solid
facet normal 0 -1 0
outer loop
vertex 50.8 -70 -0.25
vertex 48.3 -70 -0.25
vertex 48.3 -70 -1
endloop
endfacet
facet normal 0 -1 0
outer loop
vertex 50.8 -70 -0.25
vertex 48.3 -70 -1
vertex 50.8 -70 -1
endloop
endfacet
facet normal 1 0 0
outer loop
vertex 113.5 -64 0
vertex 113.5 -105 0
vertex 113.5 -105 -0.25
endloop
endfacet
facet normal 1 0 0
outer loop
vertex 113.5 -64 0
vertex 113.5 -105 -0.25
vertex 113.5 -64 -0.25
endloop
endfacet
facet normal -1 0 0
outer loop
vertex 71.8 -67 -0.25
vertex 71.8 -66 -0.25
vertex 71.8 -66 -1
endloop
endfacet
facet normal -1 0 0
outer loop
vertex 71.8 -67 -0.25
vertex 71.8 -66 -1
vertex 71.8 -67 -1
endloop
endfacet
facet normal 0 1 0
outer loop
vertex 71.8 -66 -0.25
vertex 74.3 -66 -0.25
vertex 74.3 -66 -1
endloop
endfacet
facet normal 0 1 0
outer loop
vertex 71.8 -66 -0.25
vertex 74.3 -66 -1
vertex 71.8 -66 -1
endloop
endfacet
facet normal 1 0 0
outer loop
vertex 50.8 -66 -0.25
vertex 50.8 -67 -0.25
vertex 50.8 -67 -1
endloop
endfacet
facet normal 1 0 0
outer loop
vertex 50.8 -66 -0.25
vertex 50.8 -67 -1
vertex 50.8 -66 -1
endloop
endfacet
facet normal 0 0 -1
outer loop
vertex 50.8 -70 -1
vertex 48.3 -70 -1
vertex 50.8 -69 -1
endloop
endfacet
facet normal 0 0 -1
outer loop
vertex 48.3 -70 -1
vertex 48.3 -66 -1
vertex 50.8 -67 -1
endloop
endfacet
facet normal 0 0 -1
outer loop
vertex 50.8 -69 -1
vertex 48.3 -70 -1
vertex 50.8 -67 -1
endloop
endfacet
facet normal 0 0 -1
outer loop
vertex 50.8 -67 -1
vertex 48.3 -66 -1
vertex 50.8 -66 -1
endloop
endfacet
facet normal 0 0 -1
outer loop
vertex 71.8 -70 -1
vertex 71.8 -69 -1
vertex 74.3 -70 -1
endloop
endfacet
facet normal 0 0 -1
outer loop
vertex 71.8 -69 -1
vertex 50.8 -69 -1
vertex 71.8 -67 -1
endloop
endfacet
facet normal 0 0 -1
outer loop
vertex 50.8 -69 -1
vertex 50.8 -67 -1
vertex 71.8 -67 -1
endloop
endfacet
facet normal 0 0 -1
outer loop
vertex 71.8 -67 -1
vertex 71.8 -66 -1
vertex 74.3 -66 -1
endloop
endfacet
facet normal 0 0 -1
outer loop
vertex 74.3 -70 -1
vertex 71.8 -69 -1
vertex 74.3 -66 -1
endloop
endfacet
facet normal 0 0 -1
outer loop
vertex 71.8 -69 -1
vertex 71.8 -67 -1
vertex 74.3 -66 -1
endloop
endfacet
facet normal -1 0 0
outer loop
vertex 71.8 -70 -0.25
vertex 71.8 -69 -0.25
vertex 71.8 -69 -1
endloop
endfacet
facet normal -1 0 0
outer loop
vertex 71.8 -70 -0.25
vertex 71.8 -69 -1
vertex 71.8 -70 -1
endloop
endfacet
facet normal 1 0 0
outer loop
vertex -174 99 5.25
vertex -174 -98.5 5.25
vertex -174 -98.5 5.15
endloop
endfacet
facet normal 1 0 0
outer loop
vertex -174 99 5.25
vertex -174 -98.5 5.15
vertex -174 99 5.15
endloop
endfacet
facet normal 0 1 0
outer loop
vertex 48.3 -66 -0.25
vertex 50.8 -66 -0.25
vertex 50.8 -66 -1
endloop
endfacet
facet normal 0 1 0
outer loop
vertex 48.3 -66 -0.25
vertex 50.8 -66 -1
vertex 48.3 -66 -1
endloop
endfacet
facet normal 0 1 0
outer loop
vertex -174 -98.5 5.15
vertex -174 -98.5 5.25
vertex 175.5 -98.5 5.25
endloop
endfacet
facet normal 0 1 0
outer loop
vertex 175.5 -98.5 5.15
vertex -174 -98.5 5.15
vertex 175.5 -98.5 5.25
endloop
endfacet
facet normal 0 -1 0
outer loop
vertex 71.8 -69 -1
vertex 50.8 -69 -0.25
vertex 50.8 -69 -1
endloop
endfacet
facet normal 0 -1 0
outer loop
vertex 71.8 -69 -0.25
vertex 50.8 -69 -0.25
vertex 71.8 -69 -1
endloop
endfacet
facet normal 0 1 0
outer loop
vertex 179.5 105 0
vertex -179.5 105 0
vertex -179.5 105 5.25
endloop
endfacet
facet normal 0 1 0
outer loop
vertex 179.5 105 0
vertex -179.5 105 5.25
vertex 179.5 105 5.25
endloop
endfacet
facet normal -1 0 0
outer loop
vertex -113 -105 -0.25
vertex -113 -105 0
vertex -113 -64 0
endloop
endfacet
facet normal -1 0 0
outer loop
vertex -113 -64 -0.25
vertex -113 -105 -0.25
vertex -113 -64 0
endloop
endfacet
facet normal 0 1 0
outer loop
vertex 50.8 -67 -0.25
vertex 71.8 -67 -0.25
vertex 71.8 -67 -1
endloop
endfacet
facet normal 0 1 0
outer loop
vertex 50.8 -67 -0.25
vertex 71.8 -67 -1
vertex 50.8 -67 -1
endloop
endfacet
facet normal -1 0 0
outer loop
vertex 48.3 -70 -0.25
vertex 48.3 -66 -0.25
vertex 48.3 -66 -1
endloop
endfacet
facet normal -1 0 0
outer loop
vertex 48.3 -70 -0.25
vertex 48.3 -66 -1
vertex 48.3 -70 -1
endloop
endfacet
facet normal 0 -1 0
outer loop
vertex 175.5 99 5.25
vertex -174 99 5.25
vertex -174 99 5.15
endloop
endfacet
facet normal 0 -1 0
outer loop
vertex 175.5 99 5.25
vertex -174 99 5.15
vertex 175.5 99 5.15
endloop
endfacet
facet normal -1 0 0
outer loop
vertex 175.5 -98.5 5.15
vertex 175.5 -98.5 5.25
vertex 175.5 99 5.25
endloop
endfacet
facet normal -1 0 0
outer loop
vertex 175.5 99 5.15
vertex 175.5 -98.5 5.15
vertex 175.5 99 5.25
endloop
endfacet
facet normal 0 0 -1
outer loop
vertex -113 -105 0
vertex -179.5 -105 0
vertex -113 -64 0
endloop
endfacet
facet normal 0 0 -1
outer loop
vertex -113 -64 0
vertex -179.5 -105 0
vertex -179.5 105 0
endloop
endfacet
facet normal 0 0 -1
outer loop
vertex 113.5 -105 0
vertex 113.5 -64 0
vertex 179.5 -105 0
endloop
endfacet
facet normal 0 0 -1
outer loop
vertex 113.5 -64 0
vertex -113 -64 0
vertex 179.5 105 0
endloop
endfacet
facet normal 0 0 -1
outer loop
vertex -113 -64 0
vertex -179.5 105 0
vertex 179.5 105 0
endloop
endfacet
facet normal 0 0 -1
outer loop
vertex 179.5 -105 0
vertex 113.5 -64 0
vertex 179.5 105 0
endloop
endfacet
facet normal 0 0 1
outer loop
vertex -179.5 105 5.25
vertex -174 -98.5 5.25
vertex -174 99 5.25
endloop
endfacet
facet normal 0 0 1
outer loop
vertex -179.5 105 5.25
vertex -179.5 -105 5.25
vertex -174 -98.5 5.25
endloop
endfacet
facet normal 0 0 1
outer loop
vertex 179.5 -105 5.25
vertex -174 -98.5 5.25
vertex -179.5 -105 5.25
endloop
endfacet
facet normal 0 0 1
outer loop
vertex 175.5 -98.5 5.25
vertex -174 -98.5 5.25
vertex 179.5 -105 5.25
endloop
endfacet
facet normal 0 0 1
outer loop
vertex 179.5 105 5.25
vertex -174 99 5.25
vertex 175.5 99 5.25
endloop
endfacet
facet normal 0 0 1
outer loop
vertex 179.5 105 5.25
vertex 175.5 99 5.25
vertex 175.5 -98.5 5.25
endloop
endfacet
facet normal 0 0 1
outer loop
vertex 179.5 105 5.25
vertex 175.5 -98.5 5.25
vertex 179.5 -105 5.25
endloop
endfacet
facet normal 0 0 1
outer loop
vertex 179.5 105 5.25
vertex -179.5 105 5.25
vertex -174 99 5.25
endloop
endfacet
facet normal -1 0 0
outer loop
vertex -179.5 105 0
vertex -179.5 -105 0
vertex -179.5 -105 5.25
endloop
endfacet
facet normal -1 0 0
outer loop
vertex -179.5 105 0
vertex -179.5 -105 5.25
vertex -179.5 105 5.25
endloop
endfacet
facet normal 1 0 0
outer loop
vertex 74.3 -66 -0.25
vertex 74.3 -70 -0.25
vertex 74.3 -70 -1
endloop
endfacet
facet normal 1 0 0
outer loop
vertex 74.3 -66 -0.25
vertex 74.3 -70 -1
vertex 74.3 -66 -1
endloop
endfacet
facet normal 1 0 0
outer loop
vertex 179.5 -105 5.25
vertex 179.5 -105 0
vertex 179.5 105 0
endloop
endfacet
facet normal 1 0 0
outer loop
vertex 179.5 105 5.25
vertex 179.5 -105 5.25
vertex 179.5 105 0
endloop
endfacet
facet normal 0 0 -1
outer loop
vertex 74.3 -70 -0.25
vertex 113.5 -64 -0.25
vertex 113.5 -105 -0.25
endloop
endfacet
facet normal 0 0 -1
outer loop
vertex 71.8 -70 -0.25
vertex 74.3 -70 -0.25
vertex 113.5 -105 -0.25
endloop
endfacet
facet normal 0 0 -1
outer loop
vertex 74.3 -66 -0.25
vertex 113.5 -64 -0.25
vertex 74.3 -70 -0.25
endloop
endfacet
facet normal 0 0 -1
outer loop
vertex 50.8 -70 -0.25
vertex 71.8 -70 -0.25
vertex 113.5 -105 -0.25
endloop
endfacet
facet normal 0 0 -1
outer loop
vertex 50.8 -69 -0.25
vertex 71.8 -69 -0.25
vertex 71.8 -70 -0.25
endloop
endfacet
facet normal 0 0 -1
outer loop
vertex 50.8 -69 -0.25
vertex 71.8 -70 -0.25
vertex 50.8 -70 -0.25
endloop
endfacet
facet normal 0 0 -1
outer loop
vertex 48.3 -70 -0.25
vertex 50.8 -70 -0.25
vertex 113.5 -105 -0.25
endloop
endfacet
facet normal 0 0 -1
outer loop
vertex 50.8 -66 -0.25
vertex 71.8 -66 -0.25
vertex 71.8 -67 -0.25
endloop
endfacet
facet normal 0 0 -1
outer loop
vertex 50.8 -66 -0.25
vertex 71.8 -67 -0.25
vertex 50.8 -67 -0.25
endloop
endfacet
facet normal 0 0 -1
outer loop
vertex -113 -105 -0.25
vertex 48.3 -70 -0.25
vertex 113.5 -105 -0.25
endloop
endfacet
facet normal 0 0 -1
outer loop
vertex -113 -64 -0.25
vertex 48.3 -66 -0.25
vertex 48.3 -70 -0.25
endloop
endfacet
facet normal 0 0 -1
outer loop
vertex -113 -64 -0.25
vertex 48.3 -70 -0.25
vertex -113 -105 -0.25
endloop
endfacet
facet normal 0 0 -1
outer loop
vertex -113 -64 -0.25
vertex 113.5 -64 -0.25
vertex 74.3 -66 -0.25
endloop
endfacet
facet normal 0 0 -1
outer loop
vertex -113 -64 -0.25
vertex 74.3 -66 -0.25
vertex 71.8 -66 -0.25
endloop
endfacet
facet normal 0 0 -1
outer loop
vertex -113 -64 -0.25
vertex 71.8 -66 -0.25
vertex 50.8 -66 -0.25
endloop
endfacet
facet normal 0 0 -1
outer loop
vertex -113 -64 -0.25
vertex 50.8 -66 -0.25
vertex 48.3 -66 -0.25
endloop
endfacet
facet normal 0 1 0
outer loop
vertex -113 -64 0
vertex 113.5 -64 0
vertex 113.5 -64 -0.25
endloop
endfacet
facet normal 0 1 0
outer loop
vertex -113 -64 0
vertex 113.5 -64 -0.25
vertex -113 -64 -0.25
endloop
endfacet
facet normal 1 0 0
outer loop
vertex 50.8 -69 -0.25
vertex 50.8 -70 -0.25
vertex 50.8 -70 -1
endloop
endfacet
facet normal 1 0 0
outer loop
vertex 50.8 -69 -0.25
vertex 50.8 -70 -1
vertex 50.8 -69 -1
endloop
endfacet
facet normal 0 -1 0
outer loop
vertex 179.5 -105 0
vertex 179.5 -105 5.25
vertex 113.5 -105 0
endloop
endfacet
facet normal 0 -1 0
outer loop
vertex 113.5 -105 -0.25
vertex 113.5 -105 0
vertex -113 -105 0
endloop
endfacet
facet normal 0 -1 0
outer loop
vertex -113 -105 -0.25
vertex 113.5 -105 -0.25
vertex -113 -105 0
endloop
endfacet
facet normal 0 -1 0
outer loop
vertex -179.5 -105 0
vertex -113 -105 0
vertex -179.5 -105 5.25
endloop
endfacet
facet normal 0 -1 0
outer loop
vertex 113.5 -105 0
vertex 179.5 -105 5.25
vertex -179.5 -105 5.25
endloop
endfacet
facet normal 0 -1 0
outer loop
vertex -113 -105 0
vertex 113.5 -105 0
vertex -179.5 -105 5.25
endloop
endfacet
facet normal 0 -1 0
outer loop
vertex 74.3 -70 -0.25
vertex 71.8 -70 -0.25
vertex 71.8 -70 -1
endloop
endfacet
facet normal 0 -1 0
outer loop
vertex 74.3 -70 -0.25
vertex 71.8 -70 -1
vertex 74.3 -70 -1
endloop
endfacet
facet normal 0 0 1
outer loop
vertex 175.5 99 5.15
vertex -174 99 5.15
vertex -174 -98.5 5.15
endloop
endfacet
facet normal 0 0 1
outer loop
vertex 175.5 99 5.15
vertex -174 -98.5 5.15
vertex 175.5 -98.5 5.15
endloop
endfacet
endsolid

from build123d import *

# Parameters (mm, degrees)
SKETCH2_W           = 359
SKETCH2_H           = 210
BOSS_EXTRUDE1_DEPTH = 5.25
SKETCH3_W           = 349.5
SKETCH3_H           = 197.5
CUT_EXTRUDE1_DEPTH  = 0.1
BOSS_EXTRUDE2_DEPTH = 1
SKETCH5_W           = 226.5
SKETCH5_H           = 41
BOSS_EXTRUDE3_DEPTH = 0.25


with BuildPart() as part:
    # Sketch2 → Boss-Extrude1 (new body)
    with BuildSketch(Plane.XY):
        Rectangle(SKETCH2_W, SKETCH2_H)
    extrude(amount=BOSS_EXTRUDE1_DEPTH)

    # Sketch3 → Cut-Extrude1 (cut)
    with BuildSketch(Plane.XY.offset(5.25)):
        with Locations((0.75, 0.25)):
            Rectangle(SKETCH3_W, SKETCH3_H)
    extrude(amount=-CUT_EXTRUDE1_DEPTH, mode=Mode.SUBTRACT)

    # Sketch4 → Boss-Extrude2 (add)
    with BuildSketch(Plane(origin=(0, 0, 0), x_dir=(-1, 0, 0), z_dir=(0, 0, -1))):
        Polygon((-71.8, -69), (-71.8, -70), (-74.3, -70), (-74.3, -66), (-71.8, -66), (-71.8, -67), (-50.8, -67), (-50.8, -66), (-48.3, -66), (-48.3, -70), (-50.8, -70), (-50.8, -69), align=None)
    extrude(amount=BOSS_EXTRUDE2_DEPTH)

    # Sketch5 → Boss-Extrude3 (add)
    with BuildSketch(Plane(origin=(0, 0, 0), x_dir=(-1, 0, 0), z_dir=(0, 0, -1))):
        with Locations((-0.25, -84.5)):
            Rectangle(SKETCH5_W, SKETCH5_H)
    extrude(amount=BOSS_EXTRUDE3_DEPTH)


solid = part.part
